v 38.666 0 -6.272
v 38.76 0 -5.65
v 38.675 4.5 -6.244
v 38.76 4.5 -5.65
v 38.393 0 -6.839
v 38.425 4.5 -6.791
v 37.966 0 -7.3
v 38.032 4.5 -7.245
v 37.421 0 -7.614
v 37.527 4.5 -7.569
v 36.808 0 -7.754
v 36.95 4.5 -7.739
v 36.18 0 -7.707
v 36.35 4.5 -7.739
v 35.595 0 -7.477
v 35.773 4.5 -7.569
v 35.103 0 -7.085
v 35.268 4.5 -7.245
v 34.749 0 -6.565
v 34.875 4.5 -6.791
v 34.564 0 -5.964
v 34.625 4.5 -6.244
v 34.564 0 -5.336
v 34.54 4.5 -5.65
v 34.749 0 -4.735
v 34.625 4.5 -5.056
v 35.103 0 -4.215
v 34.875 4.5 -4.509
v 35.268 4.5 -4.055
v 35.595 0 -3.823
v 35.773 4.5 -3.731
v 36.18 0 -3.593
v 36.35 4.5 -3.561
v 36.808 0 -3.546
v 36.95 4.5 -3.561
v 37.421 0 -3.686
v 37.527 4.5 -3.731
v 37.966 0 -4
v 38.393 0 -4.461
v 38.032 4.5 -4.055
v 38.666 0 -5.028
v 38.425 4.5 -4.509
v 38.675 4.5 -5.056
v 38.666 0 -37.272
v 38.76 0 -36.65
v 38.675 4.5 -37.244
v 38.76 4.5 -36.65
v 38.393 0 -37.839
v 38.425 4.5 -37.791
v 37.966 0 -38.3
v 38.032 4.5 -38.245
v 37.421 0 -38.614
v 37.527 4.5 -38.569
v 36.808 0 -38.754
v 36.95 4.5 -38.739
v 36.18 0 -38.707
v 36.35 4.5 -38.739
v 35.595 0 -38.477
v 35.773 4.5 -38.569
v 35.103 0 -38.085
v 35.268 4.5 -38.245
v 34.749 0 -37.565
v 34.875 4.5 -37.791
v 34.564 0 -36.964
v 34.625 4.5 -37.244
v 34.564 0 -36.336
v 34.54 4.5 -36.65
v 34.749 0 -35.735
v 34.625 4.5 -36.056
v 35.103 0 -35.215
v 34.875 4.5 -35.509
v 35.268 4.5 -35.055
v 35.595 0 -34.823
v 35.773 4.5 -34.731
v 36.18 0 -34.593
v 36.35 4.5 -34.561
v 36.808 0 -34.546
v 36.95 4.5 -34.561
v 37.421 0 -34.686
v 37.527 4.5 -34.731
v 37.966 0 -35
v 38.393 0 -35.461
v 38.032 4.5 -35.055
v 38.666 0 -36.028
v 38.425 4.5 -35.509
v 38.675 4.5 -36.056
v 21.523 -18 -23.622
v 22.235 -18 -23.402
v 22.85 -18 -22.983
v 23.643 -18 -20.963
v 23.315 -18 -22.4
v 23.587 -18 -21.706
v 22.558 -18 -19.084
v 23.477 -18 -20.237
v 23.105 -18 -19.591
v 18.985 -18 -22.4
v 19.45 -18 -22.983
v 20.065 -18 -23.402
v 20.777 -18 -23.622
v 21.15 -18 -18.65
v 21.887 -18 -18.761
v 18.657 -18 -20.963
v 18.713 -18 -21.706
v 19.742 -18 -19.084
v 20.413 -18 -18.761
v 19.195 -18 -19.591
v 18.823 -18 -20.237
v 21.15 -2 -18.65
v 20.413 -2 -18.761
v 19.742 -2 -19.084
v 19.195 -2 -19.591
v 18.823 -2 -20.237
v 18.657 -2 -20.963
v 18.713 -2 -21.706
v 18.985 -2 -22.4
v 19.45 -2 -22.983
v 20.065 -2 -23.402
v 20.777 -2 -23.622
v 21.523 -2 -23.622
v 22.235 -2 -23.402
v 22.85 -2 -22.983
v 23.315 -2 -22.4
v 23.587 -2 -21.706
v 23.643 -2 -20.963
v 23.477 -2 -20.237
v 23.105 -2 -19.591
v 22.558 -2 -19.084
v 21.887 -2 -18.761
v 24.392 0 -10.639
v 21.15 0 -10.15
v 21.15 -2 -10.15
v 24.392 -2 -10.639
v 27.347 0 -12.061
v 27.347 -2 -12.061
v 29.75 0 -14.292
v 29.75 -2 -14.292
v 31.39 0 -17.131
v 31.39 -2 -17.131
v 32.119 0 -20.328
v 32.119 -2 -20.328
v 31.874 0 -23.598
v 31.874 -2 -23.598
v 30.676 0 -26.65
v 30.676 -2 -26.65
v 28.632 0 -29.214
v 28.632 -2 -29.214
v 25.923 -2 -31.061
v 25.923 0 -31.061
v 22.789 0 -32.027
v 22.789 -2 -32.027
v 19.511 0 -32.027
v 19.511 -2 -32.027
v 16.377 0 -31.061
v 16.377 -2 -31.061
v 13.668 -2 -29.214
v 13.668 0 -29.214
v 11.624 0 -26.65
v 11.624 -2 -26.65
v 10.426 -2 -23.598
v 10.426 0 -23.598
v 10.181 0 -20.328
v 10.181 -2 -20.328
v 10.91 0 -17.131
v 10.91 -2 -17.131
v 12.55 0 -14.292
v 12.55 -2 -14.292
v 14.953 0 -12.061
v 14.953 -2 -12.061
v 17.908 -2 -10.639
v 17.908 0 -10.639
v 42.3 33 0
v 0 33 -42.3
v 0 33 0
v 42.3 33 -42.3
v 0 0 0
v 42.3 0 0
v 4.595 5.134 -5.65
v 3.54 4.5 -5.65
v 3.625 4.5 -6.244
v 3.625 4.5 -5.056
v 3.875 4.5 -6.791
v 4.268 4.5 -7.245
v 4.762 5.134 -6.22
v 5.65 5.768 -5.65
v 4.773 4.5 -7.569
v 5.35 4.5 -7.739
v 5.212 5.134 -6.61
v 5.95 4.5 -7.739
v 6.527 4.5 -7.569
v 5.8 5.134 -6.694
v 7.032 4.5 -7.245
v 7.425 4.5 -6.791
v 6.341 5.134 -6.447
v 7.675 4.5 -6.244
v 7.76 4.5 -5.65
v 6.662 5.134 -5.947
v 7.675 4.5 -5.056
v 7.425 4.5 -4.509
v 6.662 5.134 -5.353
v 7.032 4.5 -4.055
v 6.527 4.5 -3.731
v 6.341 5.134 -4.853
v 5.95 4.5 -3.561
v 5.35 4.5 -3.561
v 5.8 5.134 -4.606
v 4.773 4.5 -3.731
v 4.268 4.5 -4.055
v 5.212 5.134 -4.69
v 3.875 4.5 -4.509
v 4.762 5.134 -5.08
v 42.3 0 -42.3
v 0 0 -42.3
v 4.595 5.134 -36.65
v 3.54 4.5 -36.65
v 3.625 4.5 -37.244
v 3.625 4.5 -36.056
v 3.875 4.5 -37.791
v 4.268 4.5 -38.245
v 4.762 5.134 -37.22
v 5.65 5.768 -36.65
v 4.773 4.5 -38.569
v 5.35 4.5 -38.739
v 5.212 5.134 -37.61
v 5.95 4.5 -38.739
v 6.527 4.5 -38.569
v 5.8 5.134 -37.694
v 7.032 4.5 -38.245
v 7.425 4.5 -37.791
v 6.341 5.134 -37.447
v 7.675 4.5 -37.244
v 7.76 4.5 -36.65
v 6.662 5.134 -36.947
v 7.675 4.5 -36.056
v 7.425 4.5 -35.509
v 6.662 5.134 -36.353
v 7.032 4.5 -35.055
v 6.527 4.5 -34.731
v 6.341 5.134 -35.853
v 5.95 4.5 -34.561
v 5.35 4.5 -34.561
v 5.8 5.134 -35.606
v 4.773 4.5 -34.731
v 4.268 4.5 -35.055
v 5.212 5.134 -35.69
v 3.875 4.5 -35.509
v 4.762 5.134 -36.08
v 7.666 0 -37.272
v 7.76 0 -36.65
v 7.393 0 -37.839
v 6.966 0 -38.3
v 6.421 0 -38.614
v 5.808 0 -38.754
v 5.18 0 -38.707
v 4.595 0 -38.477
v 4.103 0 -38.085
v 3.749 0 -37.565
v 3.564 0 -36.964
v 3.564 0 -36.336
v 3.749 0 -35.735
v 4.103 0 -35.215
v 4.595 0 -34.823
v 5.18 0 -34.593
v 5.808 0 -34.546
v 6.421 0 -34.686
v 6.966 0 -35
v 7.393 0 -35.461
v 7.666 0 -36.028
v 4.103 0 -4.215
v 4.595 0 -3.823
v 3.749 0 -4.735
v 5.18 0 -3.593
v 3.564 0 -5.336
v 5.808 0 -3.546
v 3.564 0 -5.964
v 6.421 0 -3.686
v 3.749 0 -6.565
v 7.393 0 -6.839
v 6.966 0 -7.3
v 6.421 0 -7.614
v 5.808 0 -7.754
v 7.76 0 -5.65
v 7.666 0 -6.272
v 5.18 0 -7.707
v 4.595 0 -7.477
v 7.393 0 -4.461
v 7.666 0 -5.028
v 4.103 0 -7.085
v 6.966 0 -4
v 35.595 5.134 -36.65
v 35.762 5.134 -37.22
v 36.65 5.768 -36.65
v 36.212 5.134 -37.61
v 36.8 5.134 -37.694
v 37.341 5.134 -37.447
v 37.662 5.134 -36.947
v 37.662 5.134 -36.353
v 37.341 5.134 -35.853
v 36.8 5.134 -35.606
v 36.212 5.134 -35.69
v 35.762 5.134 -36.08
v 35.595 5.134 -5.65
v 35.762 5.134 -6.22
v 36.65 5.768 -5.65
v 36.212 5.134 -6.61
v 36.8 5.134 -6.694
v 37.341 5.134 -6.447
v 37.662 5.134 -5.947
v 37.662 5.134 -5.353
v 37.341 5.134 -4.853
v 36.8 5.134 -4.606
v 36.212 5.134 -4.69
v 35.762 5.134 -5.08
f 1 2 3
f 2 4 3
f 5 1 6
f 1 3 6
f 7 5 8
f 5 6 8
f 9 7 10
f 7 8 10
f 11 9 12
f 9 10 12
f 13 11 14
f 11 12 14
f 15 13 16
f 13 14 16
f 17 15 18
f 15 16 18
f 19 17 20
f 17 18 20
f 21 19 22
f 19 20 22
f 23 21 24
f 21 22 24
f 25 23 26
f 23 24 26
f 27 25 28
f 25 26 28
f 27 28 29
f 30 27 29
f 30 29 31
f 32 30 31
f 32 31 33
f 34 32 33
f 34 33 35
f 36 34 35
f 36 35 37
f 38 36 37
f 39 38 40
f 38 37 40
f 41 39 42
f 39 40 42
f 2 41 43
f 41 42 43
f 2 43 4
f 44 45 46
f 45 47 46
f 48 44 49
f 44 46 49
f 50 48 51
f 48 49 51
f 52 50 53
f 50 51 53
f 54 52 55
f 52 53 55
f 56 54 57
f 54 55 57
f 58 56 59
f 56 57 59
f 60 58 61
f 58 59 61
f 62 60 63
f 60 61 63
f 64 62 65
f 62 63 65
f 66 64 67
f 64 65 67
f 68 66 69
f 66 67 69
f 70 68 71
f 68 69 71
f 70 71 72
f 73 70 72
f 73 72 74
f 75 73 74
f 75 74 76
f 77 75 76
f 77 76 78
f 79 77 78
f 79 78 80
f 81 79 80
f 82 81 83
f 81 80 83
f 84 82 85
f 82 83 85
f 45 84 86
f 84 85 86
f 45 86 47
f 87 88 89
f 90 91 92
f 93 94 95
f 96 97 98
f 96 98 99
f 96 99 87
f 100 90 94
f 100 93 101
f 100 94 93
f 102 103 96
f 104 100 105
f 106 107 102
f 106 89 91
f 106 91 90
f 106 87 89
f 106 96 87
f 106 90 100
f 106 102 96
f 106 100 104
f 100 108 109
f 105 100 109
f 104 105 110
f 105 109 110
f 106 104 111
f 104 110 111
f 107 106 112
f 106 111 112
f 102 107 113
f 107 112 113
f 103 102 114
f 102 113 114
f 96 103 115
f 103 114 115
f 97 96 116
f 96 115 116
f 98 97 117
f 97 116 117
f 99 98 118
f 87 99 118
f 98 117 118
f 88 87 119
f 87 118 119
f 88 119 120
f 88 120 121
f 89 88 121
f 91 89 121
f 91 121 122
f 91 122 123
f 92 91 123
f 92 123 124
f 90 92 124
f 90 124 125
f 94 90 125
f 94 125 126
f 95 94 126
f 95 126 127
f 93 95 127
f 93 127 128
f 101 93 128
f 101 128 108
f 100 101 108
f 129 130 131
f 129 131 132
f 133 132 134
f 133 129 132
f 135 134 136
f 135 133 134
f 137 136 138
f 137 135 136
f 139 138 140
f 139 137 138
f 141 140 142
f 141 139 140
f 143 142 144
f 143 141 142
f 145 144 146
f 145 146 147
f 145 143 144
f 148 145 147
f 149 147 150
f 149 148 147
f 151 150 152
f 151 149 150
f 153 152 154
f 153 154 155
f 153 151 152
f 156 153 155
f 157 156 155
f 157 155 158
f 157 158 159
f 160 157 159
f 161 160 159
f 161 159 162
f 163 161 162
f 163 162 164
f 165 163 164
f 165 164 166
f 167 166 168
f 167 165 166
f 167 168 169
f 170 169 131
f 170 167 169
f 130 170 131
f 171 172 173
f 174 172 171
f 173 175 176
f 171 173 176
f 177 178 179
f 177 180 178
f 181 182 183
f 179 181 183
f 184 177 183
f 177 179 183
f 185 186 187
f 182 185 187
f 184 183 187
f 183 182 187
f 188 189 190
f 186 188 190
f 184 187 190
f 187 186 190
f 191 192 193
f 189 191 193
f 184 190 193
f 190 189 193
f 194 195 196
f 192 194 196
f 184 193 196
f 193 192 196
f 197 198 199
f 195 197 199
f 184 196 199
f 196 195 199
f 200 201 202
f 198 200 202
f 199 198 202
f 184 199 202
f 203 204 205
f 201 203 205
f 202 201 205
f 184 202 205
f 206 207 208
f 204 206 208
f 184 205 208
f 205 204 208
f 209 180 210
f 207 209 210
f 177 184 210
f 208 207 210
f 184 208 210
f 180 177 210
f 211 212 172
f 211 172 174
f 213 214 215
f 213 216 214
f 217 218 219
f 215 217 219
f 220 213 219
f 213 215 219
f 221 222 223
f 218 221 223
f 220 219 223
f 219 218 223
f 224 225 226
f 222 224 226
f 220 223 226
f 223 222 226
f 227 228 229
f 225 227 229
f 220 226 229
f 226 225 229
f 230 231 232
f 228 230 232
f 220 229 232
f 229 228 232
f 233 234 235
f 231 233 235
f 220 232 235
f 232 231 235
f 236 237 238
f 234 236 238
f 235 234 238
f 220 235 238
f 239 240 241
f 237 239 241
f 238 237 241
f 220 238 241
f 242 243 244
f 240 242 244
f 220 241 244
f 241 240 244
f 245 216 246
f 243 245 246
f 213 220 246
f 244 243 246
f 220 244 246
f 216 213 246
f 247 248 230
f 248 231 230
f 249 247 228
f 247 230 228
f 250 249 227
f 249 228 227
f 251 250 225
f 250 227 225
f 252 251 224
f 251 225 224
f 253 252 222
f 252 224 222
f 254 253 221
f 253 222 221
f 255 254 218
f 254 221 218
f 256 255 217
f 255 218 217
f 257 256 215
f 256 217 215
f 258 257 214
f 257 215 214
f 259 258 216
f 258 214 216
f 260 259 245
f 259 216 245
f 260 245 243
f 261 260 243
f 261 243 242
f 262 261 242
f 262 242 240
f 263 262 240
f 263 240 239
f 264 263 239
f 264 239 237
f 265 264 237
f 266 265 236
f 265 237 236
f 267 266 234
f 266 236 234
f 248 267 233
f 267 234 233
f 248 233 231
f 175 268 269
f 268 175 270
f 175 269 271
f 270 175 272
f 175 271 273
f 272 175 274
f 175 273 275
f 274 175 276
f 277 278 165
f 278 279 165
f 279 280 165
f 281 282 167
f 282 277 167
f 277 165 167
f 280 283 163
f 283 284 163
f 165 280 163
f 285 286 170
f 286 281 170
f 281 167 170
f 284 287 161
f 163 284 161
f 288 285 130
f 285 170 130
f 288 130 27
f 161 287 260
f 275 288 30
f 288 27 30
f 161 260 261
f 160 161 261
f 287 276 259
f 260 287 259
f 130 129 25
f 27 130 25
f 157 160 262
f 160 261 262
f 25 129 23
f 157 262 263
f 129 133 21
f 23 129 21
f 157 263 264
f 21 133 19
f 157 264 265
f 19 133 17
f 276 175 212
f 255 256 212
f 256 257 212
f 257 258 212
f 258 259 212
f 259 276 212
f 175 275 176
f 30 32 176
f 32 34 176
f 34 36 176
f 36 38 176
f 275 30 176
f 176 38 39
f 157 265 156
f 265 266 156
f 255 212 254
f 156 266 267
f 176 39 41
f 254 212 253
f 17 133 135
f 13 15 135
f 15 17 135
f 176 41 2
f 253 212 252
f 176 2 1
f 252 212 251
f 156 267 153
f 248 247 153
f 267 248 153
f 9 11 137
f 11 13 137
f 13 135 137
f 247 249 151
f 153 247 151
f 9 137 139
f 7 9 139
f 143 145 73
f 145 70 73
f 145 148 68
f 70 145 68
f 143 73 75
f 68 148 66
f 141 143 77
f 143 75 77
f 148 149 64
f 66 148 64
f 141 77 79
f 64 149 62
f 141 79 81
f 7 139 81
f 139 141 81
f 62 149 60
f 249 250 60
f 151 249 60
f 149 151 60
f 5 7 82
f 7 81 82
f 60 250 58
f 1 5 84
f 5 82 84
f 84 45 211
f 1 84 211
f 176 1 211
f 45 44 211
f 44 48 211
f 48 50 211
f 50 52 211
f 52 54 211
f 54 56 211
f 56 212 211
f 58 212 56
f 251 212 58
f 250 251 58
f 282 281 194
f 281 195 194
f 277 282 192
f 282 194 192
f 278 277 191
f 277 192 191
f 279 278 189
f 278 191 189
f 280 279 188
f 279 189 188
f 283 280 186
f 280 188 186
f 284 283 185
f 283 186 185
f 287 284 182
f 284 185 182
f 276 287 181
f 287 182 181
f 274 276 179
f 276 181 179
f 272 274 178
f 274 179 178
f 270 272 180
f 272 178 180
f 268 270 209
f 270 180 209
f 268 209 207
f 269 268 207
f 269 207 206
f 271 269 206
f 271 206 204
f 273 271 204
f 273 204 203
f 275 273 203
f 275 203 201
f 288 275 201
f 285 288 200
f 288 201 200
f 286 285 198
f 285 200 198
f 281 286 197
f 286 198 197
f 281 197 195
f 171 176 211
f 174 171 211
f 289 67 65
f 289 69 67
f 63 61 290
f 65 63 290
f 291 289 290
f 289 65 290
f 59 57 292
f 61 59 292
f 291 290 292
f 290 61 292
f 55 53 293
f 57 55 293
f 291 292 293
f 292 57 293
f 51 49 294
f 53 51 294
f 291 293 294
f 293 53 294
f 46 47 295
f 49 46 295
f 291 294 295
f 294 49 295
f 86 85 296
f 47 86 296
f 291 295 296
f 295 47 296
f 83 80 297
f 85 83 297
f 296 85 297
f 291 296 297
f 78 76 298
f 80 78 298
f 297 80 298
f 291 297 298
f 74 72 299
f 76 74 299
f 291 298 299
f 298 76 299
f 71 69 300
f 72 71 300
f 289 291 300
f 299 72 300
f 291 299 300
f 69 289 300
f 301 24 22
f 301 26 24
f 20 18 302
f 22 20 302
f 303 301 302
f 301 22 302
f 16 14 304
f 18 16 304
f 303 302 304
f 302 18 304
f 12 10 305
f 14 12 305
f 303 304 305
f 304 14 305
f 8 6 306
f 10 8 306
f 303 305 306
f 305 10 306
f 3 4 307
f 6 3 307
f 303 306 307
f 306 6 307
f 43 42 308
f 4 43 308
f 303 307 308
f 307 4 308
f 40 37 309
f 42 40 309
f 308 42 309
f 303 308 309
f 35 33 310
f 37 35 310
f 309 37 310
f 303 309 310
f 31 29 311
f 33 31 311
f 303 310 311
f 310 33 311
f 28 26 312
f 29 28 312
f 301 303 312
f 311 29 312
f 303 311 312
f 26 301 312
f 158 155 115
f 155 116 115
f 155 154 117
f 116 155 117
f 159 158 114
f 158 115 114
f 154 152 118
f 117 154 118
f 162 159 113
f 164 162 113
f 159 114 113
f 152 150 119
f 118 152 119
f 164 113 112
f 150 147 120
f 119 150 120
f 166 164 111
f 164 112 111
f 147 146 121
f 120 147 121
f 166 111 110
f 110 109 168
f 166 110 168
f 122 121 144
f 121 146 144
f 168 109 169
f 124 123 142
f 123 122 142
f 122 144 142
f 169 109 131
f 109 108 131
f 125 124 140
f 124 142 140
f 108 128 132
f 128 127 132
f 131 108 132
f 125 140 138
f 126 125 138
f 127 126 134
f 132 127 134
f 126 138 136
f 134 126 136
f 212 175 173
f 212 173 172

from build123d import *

# Parameters (mm, degrees)
SKETCH1_W                          = 42.3
SKETCH1_H                          = 42.3
BOSS_EXTRUDE1_DEPTH                = 33
SKETCH2_R                          = 2.5
BOSS_EXTRUDE3_DEPTH                = 18
HOLE_FOR_M3_300_SC_NUTS_SP_2_D     = 4.22
HOLE_FOR_M3_300_SC_NUTS_SP_2_DEPTH = 4.5
HOLE_FOR_M3_300_SC_NUTS_SP_2_TIP   = 1.267815906
SKETCH5_R                          = 11
BOSS_EXTRUDE4_DEPTH                = 2


with BuildPart() as part:
    # Sketch1 → Boss-Extrude1 (new body)
    with BuildSketch(Plane(origin=(0, 0, 0), x_dir=(1, 0, 0), z_dir=(0, 1, 0))):
        with Locations((21.15, 21.15)):
            Rectangle(SKETCH1_W, SKETCH1_H)
    extrude(amount=BOSS_EXTRUDE1_DEPTH)

    # Sketch2 → Boss-Extrude3 (add)
    with BuildSketch(Plane(origin=(0, 0, 0), x_dir=(-1, 0, 0), z_dir=(0, -1, 0))):
        with Locations(Location((-21.15, 21.15, 0), (0, 0, 270))):
            Circle(SKETCH2_R)
    extrude(amount=BOSS_EXTRUDE3_DEPTH)

    # Hole for M3 300® SC Nuts (SP)2
    with Locations(Plane(origin=(0, 0, 0), x_dir=(-1, 0, 0), z_dir=(0, -1, 0))):
        with Locations((-5.65, 36.65), (-5.65, 5.65), (-36.65, 5.65), (-36.65, 36.65)):
            Hole(HOLE_FOR_M3_300_SC_NUTS_SP_2_D / 2, depth=HOLE_FOR_M3_300_SC_NUTS_SP_2_DEPTH)
            with Locations((0, 0, -(HOLE_FOR_M3_300_SC_NUTS_SP_2_DEPTH + HOLE_FOR_M3_300_SC_NUTS_SP_2_TIP / 2))):  # 118° drill point
                Cone(0, HOLE_FOR_M3_300_SC_NUTS_SP_2_D / 2, HOLE_FOR_M3_300_SC_NUTS_SP_2_TIP, mode=Mode.SUBTRACT)

    # Sketch5 → Boss-Extrude4 (add)
    with BuildSketch(Plane(origin=(0, 0, 0), x_dir=(1, 0, 0), z_dir=(0, 1, 0))):
        with Locations(Location((21.15, 21.15, 0), (0, 0, 270))):
            Circle(SKETCH5_R)
    extrude(amount=-BOSS_EXTRUDE4_DEPTH)


solid = part.part
